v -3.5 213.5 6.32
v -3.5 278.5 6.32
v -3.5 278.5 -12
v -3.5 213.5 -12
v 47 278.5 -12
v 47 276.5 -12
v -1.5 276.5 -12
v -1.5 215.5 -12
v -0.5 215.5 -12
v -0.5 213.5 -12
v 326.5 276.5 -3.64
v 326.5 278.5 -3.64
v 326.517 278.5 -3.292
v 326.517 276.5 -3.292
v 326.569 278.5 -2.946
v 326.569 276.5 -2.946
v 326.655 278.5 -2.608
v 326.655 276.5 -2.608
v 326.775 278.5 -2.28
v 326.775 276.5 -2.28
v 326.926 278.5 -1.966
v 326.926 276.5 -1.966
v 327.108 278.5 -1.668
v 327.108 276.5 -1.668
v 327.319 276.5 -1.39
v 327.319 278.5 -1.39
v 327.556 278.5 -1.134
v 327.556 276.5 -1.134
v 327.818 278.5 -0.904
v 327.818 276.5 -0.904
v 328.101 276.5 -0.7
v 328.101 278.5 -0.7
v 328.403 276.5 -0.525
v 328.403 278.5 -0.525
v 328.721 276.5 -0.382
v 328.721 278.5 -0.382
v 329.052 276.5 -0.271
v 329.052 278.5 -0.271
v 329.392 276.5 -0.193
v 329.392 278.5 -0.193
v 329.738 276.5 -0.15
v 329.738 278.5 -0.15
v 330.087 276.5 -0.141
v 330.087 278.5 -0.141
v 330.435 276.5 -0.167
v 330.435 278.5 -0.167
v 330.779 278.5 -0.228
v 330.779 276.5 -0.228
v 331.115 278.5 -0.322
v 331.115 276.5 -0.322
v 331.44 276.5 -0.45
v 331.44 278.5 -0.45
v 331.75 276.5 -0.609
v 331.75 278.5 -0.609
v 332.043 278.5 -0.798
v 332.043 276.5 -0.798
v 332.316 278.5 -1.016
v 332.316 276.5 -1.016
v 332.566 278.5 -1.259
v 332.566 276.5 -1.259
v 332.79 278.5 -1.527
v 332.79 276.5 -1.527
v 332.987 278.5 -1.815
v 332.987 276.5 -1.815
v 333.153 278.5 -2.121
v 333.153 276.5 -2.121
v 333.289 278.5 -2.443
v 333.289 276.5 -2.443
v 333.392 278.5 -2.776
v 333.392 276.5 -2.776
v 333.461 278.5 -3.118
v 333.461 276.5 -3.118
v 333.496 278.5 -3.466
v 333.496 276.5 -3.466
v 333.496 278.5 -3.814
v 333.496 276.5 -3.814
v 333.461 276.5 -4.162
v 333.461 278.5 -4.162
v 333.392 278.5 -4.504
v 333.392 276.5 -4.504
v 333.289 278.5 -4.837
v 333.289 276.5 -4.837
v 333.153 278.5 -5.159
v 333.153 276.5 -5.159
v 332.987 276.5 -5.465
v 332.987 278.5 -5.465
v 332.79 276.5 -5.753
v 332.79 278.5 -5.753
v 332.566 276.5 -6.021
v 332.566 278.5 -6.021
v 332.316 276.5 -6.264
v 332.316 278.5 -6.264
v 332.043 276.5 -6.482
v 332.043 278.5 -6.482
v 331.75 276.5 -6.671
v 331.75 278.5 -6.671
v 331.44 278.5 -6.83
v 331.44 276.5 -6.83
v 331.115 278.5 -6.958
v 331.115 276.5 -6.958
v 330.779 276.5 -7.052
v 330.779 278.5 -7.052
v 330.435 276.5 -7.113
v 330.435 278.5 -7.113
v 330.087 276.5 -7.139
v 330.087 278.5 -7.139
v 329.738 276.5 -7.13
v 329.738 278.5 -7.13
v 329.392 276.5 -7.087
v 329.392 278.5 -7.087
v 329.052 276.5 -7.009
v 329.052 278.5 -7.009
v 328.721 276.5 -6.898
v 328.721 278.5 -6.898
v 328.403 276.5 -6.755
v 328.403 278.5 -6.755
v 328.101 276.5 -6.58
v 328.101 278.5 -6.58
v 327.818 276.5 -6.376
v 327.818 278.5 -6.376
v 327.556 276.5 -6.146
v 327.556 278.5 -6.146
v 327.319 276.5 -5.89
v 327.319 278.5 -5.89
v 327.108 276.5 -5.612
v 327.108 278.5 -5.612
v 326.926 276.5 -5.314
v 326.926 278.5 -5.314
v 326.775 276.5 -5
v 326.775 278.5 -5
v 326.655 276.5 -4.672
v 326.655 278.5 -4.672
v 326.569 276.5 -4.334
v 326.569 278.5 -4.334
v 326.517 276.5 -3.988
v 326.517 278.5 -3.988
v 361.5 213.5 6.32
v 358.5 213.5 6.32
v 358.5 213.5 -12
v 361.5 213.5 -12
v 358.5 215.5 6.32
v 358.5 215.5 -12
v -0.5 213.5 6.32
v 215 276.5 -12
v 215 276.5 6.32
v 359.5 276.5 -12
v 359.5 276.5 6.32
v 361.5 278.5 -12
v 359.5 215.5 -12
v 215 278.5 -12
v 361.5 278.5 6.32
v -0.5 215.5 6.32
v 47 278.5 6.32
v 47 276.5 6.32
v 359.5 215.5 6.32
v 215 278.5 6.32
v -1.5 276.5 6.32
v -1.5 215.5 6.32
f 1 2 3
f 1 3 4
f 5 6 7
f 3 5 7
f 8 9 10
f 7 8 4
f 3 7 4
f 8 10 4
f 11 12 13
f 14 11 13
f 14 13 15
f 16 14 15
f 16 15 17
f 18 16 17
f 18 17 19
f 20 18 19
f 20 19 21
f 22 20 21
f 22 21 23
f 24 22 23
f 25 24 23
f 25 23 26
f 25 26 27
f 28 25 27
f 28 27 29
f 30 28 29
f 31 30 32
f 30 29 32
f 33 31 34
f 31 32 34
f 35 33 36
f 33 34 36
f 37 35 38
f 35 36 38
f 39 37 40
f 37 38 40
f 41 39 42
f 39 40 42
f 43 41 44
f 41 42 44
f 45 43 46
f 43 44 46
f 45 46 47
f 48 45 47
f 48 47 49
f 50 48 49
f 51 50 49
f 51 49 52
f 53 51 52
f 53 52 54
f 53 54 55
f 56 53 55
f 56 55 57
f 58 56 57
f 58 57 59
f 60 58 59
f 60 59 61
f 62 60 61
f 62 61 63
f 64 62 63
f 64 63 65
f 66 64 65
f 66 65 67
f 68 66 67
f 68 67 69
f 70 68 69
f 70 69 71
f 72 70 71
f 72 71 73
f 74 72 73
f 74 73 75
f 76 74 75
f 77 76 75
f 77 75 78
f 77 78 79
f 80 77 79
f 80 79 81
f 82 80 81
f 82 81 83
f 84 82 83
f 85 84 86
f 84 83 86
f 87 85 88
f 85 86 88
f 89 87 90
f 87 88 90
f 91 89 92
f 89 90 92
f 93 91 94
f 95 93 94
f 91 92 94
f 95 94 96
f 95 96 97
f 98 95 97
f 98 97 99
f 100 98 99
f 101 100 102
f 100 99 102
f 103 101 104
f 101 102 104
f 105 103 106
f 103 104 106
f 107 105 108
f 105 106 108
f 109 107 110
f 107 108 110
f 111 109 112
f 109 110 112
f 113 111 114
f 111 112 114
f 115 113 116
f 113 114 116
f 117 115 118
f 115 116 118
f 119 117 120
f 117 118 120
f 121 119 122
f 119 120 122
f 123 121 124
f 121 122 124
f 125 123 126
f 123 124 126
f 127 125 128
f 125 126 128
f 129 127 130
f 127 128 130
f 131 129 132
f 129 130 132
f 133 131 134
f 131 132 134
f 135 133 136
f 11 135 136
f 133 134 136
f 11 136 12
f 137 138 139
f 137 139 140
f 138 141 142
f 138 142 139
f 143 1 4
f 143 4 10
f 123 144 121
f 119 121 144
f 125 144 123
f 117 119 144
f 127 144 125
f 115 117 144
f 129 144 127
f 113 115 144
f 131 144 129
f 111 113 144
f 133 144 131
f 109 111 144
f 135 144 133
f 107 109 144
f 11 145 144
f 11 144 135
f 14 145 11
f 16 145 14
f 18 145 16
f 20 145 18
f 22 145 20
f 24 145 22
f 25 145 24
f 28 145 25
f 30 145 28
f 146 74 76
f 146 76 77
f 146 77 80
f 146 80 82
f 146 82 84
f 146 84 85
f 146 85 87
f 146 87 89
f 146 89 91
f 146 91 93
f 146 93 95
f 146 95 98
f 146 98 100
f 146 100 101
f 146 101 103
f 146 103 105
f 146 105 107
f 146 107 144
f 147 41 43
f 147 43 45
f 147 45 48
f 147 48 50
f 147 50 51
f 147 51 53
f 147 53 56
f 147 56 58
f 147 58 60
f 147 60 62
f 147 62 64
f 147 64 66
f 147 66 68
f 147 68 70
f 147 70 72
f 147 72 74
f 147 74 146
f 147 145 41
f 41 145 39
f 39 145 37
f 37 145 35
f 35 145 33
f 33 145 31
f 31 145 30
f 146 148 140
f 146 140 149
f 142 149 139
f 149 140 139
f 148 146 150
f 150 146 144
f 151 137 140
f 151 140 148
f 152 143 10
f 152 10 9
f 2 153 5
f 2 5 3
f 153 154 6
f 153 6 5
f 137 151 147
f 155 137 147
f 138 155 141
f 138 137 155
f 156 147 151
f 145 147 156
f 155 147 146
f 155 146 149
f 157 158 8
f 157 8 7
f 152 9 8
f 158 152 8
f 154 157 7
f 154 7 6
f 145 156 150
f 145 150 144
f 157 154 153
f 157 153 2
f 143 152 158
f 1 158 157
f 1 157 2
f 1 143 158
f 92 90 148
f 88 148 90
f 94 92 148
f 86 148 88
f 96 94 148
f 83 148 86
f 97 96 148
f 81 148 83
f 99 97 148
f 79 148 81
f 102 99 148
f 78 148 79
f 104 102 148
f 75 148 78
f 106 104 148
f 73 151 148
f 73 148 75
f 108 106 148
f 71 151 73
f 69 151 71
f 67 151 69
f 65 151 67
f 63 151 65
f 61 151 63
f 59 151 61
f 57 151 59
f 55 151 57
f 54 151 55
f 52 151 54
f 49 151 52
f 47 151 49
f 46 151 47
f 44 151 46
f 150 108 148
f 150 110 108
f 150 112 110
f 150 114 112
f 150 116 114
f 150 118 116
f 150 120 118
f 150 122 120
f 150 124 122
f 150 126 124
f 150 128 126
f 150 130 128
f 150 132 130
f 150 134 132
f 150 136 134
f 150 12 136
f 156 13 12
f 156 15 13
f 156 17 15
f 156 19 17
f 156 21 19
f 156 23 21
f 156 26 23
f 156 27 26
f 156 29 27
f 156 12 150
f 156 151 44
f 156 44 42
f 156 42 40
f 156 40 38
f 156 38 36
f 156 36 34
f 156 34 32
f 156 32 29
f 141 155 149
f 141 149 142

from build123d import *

# Parameters (mm, degrees)
SKETCH156_R      = 3.5
EXTRUDE146_DEPTH = 10
EXTRUDE031_DEPTH = 18.32


with BuildPart() as extrude146:
    # Sketch156 → Extrude146 (new body)
    with BuildSketch(Plane(origin=(0, 280, 0), x_dir=(-1, 0, 0), z_dir=(0, 1, 0))):
        with Locations((-330, -3.64)):
            Circle(SKETCH156_R)
    extrude(amount=-EXTRUDE146_DEPTH)


with BuildPart() as side004:
    # Sketch037 → Extrude031 (new body)
    with BuildSketch(Plane(origin=(0, 0, 6.32), x_dir=(1, 0, 0), z_dir=(0, 0, -1))):
        Polygon((361.5, -213.5), (361.5, -278.5), (215, -278.5), (215, -276.5), (359.5, -276.5), (359.5, -215.5), (358.5, -215.5), (358.5, -213.5), align=None)
        Polygon((-3.5, -278.5), (-3.5, -213.5), (-0.5, -213.5), (-0.5, -215.5), (-1.5, -215.5), (-1.5, -276.5), (47, -276.5), (47, -278.5), align=None)
    extrude(amount=EXTRUDE031_DEPTH)

    # Cut016: cut Extrude146
    add(extrude146.part, mode=Mode.SUBTRACT)


solid = side004.part
